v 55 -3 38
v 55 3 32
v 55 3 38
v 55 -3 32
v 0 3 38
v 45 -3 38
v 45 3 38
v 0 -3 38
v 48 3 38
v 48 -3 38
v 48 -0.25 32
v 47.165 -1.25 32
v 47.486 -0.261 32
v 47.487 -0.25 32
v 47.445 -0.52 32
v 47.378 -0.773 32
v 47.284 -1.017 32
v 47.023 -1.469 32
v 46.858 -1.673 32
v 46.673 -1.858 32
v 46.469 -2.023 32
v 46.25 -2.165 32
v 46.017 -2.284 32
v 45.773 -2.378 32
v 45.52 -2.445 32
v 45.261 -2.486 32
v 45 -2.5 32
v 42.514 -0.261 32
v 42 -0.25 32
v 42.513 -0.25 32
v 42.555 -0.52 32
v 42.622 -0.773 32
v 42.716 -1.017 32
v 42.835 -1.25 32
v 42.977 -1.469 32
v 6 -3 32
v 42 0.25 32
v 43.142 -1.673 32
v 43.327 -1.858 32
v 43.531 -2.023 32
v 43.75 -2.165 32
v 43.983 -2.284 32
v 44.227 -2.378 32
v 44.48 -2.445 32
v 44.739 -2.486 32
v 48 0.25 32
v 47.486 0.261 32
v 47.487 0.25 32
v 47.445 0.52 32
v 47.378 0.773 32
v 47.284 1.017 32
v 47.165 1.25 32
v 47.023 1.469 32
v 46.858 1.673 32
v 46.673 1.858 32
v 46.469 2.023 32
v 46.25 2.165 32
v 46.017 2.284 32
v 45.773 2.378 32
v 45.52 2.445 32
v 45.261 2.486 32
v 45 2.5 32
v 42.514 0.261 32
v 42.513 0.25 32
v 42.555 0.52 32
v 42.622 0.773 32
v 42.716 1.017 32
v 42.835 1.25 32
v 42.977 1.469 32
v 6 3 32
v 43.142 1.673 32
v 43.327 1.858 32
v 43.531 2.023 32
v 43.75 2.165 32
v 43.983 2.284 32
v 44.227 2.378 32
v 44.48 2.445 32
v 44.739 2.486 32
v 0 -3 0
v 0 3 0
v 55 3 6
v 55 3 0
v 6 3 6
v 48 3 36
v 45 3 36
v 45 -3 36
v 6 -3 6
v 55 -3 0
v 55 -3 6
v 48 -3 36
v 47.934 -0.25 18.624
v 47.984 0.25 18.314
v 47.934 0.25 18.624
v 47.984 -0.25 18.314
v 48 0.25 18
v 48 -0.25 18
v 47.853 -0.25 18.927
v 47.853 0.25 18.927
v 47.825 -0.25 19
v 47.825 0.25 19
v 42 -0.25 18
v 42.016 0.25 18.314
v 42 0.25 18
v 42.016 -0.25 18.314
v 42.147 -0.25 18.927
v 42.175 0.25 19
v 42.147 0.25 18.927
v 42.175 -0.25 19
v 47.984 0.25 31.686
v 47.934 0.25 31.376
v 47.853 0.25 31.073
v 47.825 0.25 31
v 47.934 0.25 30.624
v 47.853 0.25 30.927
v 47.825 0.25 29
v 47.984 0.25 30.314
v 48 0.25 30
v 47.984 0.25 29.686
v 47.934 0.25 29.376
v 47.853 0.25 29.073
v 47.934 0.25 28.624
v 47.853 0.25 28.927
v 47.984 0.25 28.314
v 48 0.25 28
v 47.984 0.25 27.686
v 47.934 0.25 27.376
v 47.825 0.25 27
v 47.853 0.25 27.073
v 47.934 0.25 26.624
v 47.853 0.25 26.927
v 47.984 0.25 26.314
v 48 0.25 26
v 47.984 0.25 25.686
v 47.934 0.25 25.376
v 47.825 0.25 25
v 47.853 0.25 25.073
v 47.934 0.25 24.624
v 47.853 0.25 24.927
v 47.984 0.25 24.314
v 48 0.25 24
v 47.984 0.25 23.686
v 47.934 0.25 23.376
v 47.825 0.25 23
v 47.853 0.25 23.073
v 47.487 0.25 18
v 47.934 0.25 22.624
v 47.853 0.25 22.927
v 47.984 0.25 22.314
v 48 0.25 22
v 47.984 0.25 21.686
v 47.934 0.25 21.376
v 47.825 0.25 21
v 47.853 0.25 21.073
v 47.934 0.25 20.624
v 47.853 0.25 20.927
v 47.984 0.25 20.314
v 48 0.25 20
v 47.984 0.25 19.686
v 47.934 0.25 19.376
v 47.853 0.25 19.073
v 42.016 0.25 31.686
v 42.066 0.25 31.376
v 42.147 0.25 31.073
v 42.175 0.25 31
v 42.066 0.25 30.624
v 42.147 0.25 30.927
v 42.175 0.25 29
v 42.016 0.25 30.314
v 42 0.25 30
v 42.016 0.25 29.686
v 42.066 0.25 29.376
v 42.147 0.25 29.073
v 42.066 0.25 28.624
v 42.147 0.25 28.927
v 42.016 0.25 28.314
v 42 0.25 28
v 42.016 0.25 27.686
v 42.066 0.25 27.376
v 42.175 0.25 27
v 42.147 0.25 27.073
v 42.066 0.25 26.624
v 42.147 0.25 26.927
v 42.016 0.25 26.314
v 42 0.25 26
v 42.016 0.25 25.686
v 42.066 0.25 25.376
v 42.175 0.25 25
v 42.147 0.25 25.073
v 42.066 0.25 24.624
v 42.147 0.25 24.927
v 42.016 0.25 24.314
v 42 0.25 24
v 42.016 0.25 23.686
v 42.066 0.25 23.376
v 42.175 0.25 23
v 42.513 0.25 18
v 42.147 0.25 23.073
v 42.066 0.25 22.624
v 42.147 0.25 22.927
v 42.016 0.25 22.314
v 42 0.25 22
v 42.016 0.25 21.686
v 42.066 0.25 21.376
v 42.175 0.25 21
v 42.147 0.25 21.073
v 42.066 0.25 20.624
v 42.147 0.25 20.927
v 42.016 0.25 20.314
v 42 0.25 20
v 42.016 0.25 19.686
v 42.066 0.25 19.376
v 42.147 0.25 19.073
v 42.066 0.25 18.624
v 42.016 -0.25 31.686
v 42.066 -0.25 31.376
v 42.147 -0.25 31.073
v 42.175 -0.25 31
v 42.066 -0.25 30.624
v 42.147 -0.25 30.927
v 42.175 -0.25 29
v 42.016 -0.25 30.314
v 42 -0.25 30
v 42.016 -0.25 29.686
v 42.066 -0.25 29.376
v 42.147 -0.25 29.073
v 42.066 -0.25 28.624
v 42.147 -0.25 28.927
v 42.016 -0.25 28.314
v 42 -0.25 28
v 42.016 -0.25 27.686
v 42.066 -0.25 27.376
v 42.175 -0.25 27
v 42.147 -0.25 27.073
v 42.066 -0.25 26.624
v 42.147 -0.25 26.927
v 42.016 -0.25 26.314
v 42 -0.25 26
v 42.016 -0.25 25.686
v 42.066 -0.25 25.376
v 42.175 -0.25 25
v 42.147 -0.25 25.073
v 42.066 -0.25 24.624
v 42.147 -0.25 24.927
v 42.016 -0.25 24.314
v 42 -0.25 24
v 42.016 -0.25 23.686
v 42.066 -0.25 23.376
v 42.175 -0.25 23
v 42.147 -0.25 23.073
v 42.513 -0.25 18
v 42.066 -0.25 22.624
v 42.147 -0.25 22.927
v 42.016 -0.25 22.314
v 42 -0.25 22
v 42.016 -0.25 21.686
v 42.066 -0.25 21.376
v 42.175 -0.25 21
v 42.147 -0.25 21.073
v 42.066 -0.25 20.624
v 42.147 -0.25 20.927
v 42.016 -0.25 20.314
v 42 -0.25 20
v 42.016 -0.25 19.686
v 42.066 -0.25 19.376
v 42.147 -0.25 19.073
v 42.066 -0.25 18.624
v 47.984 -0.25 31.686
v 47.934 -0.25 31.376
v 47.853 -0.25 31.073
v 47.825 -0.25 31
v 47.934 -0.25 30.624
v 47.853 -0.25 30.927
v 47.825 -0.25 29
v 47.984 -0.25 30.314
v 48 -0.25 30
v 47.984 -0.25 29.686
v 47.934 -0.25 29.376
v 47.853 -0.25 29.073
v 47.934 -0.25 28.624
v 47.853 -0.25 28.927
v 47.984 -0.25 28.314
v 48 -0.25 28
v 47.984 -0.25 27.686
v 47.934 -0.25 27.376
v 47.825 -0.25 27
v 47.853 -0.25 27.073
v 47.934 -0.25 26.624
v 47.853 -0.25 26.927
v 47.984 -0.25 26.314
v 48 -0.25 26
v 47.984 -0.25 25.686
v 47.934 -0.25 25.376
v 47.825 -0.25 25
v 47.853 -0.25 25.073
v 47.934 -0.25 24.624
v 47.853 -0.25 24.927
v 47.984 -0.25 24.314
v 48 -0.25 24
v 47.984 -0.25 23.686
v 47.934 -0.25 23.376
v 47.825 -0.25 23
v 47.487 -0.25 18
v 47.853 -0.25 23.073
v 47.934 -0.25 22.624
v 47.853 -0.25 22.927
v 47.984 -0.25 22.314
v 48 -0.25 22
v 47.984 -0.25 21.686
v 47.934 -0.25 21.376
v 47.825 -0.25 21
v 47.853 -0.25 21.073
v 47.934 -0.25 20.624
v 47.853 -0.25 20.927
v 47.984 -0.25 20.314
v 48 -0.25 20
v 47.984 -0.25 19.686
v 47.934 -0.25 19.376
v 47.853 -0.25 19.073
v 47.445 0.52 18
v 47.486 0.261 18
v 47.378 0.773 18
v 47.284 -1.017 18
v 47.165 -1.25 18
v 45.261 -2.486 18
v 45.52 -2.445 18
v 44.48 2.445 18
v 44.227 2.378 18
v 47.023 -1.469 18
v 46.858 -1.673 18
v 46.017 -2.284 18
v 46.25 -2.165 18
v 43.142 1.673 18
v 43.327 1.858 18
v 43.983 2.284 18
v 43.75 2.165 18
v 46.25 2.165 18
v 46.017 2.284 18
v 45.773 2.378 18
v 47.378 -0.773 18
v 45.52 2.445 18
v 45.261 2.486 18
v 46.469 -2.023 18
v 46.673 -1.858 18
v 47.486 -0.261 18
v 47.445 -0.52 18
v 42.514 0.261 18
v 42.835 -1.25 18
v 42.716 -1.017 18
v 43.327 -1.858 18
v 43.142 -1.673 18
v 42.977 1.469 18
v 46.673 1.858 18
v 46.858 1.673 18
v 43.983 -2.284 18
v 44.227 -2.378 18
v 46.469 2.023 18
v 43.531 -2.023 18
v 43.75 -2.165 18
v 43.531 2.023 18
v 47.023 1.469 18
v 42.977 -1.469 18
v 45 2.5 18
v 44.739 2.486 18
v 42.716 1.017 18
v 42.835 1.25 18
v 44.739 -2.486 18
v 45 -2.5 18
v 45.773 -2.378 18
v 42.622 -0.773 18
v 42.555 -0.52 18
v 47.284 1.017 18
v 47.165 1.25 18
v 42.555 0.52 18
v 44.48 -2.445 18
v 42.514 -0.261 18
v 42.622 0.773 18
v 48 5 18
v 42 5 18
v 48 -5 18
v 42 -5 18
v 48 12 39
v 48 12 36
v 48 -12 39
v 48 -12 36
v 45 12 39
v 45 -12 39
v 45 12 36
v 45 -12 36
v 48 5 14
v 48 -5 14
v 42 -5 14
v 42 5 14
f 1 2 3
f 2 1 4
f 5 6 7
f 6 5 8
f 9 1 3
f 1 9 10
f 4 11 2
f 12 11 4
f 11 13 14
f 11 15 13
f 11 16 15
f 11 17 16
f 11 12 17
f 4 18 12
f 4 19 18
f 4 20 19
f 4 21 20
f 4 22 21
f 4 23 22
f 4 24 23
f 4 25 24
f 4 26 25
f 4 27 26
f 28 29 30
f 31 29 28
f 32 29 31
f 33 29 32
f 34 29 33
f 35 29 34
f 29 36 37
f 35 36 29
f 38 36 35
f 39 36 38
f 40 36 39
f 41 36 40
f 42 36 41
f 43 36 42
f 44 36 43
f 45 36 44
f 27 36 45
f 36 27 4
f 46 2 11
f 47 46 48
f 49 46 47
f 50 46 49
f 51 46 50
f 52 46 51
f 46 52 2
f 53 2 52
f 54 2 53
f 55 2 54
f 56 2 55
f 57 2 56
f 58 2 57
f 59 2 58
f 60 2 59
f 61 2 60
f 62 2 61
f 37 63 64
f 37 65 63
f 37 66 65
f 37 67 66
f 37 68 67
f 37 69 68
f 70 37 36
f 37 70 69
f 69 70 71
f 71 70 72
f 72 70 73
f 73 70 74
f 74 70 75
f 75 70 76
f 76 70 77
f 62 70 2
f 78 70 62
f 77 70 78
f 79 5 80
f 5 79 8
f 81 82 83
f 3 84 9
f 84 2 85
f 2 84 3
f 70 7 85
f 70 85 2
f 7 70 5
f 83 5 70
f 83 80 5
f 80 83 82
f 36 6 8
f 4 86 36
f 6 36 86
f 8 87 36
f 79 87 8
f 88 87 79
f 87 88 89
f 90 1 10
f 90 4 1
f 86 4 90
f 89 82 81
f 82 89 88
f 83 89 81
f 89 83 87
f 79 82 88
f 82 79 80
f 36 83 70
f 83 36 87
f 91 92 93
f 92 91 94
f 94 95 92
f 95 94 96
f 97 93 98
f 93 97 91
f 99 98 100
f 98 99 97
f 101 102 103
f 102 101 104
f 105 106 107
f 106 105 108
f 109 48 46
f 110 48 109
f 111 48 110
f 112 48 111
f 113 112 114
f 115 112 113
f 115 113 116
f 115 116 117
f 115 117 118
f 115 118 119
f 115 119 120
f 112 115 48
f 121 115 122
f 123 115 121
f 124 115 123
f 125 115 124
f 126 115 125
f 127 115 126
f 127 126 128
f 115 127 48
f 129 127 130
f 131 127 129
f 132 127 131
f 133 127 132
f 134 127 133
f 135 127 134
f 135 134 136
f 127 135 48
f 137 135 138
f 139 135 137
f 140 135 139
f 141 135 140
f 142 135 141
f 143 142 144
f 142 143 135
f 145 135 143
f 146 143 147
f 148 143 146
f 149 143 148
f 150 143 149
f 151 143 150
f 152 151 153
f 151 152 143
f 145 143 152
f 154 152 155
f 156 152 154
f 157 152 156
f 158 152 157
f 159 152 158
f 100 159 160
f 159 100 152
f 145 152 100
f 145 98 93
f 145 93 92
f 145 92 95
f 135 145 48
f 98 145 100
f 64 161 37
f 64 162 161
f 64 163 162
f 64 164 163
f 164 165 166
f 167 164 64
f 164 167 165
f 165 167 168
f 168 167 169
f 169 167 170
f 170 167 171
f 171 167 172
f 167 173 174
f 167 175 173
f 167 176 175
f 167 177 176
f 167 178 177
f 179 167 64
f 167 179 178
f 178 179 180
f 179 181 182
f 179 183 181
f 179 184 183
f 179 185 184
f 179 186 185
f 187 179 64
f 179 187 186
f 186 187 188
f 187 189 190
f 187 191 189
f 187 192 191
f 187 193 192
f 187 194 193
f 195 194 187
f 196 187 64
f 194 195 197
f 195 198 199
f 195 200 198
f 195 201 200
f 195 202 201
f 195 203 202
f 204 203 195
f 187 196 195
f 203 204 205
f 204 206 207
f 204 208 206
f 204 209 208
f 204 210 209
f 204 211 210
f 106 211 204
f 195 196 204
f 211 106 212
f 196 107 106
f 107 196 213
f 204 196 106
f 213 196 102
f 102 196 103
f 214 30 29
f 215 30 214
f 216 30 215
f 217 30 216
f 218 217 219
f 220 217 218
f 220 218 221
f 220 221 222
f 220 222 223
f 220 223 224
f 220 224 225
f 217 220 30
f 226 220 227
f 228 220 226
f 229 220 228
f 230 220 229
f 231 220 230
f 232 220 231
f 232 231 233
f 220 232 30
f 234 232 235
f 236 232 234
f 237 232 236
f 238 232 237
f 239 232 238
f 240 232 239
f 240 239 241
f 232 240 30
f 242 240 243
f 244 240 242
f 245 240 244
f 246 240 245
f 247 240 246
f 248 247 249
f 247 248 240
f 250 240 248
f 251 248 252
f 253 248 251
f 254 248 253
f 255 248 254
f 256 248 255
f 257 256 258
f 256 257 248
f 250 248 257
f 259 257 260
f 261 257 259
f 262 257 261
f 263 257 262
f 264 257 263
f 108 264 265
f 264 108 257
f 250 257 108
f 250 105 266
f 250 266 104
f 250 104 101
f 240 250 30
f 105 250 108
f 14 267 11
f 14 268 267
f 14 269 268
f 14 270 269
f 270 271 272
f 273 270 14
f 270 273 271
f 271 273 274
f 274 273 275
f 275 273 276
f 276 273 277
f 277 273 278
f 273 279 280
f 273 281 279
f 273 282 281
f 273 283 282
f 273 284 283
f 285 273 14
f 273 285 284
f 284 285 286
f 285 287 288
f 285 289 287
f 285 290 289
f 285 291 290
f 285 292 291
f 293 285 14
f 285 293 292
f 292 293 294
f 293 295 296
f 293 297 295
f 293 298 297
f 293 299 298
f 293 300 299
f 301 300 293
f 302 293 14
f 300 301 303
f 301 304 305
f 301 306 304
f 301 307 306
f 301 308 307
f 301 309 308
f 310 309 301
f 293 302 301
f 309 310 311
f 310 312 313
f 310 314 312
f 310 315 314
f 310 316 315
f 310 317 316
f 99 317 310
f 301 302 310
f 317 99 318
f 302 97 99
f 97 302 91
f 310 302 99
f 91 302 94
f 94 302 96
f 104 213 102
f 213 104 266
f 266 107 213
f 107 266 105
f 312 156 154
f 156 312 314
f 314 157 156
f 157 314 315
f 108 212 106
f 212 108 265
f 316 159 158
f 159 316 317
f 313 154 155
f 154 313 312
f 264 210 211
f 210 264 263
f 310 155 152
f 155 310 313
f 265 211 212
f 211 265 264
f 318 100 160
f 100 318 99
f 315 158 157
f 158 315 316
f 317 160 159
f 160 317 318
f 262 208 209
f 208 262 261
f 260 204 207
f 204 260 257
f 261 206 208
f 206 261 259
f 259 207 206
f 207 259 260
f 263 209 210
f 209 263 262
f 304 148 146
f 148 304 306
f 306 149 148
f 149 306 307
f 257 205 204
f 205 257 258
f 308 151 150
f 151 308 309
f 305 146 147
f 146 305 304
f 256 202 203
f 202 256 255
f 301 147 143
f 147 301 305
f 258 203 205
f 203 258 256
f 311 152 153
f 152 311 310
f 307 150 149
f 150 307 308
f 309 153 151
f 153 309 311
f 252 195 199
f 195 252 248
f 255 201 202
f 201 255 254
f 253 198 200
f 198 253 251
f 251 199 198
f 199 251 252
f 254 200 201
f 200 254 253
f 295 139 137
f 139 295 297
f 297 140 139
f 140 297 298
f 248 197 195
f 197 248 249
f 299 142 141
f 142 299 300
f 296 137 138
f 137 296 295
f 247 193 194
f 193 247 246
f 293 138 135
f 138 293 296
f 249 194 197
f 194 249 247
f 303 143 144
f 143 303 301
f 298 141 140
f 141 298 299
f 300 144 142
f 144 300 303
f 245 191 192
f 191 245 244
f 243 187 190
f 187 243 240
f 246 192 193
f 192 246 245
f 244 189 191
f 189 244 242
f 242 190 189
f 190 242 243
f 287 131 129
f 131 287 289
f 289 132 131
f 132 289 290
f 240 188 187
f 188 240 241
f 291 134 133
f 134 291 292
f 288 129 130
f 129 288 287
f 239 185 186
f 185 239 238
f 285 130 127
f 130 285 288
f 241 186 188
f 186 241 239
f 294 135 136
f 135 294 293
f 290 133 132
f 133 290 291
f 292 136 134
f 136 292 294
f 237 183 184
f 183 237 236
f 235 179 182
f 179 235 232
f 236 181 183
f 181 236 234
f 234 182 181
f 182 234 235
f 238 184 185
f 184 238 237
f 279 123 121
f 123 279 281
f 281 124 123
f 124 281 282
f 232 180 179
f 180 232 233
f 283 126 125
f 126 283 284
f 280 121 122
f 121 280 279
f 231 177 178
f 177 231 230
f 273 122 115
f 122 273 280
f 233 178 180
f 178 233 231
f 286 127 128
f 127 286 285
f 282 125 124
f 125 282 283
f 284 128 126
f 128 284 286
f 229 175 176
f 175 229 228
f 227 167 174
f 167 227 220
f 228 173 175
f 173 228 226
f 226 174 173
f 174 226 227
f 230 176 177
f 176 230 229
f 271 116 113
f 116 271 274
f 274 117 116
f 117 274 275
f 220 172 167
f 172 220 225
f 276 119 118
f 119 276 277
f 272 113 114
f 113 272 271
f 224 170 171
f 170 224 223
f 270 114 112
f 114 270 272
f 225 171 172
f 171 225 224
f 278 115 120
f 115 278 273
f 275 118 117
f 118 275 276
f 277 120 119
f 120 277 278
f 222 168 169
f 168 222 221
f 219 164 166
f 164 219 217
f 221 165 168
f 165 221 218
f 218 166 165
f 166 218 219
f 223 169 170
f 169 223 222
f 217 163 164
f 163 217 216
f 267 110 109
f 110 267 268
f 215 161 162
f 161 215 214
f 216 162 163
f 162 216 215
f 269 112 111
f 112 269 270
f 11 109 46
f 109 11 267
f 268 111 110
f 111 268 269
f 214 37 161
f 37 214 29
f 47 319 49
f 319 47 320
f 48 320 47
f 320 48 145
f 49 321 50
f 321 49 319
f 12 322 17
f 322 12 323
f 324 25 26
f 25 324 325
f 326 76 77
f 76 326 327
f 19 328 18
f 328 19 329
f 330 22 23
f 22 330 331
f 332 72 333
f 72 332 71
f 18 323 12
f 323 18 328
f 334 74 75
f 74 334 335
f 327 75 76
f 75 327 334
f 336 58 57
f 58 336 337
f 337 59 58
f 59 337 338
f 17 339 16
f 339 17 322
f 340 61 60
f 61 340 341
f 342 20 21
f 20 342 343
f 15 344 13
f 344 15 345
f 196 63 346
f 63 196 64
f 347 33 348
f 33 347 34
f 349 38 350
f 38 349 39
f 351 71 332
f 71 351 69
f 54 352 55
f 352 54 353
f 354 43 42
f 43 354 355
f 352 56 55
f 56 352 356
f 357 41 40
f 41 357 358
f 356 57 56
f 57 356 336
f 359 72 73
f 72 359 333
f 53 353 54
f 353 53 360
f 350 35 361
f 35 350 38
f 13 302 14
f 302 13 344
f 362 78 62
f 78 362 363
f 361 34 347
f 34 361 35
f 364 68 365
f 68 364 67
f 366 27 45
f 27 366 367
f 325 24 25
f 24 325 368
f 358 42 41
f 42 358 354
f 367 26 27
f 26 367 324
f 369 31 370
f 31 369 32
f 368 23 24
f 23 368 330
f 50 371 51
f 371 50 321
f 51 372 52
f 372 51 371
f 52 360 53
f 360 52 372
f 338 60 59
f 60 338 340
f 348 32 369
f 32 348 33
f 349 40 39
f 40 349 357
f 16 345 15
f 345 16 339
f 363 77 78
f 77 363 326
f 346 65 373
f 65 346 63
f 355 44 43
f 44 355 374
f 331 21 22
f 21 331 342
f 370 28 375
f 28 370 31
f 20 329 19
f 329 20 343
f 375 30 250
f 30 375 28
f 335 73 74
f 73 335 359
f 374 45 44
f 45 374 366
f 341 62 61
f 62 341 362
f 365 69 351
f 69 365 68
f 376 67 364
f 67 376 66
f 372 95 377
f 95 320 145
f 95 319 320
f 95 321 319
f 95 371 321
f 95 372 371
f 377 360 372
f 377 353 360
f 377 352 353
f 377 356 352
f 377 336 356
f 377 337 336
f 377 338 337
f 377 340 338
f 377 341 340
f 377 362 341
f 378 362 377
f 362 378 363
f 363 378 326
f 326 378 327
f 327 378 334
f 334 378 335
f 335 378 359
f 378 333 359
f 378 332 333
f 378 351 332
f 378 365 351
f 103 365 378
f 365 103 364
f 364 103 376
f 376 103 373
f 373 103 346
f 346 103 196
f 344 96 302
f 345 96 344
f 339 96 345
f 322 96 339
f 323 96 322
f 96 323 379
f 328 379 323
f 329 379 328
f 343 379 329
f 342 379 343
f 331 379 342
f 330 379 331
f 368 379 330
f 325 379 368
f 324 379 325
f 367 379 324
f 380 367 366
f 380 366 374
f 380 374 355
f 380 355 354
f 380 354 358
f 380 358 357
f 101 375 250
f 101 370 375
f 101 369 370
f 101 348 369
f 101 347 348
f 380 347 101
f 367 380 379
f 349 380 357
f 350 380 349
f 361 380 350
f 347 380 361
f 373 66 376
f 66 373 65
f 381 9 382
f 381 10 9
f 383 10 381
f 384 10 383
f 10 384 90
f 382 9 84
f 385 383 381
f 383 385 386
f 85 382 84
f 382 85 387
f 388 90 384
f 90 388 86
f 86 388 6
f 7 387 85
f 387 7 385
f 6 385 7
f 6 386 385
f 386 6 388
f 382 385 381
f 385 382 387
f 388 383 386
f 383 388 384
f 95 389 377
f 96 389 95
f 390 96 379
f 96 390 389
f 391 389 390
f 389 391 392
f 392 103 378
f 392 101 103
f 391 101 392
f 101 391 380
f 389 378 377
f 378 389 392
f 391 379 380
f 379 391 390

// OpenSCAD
// file: _common.scad
// mechanism 共用設定 + 齒輪 module
$fn = 60;

// 簡化齒輪：N 個齒、節圓半徑 r、齒高 h、齒寬 w
module simple_gear(N = 16, r = 20, h = 4, thick = 6) {
  union() {
    // 主圓盤
    cylinder(h = thick, r = r, center = true);
    // 齒（梯形）
    for (i = [0:N-1]) {
      rotate([0, 0, i * 360 / N])
        translate([r, 0, 0])
          linear_extrude(height = thick, center = true)
            polygon([[0, -2.4], [h, -1.4], [h, 1.4], [0, 2.4]]);
    }
    // 中心凸軸
    cylinder(h = thick * 1.4, r = r * 0.18, center = true);
  }
}
// main file
// 夾具 Clamp — C 型夾
include <_common.scad>

// C 形主體（用 difference 從矩形挖出 U 型）
color([0.55, 0.55, 0.58])
  difference() {
    // 外形 C
    union() {
      // 上臂
      translate([0, -3, 32]) cube([55, 6, 6]);
      // 下臂
      translate([0, -3, 0]) cube([55, 6, 6]);
      // 背柱
      translate([0, -3, 0]) cube([6, 6, 38]);
    }
  }

// 螺絲桿（從上臂往下旋）
color([0.4, 0.4, 0.4]) {
  translate([45, 0, 18]) cylinder(h = 18, r = 2.5);
  // 螺紋示意（用一堆環）
  for (i = [0:7]) translate([45, 0, 18 + i*2]) rotate([90, 0, 0]) cylinder(h = 0.5, r = 3, center = true);
}

// T 形手把
color([0.18, 0.18, 0.18])
  translate([45, -12, 36]) cube([3, 24, 3]);

// 夾頭（壓在物件上）
color([0.30, 0.30, 0.30])
  translate([42, -5, 14]) cube([6, 10, 4]);
